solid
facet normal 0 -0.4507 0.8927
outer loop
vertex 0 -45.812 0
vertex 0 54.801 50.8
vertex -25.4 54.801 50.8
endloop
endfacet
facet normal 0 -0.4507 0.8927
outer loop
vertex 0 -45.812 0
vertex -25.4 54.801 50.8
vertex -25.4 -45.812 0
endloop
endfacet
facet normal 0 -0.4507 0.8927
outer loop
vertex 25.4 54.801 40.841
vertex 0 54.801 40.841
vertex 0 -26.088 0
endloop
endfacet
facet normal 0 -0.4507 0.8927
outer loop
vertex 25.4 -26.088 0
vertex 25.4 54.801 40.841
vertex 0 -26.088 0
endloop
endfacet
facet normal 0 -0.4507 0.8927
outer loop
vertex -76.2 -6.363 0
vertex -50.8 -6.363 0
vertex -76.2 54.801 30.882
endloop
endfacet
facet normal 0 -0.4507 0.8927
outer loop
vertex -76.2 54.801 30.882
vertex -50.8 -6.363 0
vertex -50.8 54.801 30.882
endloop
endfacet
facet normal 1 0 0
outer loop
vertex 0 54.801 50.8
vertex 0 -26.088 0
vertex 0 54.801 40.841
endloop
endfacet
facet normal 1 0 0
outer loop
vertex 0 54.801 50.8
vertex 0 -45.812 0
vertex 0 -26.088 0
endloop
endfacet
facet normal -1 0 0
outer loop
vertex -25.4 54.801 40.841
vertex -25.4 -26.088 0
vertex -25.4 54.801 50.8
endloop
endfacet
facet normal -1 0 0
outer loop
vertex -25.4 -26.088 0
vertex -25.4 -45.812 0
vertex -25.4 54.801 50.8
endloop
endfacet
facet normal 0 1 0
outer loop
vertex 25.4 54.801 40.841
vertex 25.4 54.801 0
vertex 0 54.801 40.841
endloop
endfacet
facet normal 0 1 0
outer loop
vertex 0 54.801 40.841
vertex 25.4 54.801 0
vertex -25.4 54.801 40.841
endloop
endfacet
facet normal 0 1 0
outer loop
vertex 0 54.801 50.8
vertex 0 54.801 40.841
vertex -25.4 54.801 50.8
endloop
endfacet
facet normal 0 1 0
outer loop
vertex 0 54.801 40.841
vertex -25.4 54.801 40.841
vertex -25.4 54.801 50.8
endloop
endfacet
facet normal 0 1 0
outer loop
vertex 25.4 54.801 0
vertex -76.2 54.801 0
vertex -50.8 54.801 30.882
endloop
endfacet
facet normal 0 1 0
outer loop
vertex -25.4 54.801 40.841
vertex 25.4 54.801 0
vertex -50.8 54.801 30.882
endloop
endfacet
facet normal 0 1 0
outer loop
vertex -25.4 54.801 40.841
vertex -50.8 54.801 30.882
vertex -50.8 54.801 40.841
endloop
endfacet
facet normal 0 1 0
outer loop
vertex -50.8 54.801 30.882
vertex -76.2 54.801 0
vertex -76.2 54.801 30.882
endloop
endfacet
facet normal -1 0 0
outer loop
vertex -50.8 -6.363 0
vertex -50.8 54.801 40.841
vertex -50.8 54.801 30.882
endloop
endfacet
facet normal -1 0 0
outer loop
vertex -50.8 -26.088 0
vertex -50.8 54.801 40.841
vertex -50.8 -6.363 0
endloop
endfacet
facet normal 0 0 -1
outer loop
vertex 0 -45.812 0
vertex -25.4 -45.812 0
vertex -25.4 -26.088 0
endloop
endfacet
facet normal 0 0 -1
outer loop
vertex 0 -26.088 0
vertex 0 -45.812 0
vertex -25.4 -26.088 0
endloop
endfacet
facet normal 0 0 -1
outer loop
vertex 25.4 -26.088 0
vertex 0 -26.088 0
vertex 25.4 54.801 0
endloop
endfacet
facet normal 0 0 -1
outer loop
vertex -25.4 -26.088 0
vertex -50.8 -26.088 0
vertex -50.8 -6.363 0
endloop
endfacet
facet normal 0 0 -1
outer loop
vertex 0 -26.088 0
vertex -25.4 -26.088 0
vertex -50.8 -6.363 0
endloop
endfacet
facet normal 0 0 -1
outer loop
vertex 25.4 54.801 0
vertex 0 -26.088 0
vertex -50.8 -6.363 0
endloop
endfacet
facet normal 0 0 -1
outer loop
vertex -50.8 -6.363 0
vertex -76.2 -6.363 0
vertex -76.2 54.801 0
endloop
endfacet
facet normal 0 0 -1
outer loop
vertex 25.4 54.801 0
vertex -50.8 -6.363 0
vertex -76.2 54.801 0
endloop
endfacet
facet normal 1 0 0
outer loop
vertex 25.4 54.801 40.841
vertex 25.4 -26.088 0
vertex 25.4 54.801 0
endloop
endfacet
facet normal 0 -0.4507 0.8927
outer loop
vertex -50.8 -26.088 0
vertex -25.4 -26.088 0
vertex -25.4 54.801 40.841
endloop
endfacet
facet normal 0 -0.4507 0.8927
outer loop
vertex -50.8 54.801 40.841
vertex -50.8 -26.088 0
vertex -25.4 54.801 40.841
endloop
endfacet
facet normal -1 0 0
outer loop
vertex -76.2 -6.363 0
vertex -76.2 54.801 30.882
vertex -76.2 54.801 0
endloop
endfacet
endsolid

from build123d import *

# Parameters (mm, degrees)
F1_DEPTH = 25.4
F3_DEPTH = 25.4
F5_DEPTH = 25.4
F7_DEPTH = 25.4


with BuildPart() as f1:
    # F0 (on Right) → F1 (new body)
    with BuildSketch(Plane.YZ):
        Polygon((54.801482, 50.8), (-45.812084, 0), (30.387916, 0), (54.801482, 0), (54.801482, 7.009836), align=None)
    extrude(amount=-F1_DEPTH)

    # F2 (on face) → F3 (join)
    with BuildSketch(Plane(origin=(-25.4, 0, 0), x_dir=(0, -1, 0), z_dir=(-1, 0, 0))):
        Polygon((-54.801482, 40.841112), (-54.801482, 0), (26.08769, 0), align=None)
    extrude(amount=F3_DEPTH)

    # F4 (on face) → F5 (join)
    with BuildSketch(Plane(origin=(-50.8, 0, 0), x_dir=(0, -1, 0), z_dir=(-1, 0, 0))):
        Polygon((-54.801482, 0), (-34.971387, 0), (6.363296, 0), (-54.801482, 30.882224), align=None)
    extrude(amount=F5_DEPTH)

    # F6 (on face) → F7 (join)
    with BuildSketch(Plane.YZ):
        Polygon((54.801482, 40.841112), (-26.08769, 0), (23.767022, 0), (54.801482, 0), (54.801482, 10.363963), align=None)
    extrude(amount=F7_DEPTH)


solid = f1.part
